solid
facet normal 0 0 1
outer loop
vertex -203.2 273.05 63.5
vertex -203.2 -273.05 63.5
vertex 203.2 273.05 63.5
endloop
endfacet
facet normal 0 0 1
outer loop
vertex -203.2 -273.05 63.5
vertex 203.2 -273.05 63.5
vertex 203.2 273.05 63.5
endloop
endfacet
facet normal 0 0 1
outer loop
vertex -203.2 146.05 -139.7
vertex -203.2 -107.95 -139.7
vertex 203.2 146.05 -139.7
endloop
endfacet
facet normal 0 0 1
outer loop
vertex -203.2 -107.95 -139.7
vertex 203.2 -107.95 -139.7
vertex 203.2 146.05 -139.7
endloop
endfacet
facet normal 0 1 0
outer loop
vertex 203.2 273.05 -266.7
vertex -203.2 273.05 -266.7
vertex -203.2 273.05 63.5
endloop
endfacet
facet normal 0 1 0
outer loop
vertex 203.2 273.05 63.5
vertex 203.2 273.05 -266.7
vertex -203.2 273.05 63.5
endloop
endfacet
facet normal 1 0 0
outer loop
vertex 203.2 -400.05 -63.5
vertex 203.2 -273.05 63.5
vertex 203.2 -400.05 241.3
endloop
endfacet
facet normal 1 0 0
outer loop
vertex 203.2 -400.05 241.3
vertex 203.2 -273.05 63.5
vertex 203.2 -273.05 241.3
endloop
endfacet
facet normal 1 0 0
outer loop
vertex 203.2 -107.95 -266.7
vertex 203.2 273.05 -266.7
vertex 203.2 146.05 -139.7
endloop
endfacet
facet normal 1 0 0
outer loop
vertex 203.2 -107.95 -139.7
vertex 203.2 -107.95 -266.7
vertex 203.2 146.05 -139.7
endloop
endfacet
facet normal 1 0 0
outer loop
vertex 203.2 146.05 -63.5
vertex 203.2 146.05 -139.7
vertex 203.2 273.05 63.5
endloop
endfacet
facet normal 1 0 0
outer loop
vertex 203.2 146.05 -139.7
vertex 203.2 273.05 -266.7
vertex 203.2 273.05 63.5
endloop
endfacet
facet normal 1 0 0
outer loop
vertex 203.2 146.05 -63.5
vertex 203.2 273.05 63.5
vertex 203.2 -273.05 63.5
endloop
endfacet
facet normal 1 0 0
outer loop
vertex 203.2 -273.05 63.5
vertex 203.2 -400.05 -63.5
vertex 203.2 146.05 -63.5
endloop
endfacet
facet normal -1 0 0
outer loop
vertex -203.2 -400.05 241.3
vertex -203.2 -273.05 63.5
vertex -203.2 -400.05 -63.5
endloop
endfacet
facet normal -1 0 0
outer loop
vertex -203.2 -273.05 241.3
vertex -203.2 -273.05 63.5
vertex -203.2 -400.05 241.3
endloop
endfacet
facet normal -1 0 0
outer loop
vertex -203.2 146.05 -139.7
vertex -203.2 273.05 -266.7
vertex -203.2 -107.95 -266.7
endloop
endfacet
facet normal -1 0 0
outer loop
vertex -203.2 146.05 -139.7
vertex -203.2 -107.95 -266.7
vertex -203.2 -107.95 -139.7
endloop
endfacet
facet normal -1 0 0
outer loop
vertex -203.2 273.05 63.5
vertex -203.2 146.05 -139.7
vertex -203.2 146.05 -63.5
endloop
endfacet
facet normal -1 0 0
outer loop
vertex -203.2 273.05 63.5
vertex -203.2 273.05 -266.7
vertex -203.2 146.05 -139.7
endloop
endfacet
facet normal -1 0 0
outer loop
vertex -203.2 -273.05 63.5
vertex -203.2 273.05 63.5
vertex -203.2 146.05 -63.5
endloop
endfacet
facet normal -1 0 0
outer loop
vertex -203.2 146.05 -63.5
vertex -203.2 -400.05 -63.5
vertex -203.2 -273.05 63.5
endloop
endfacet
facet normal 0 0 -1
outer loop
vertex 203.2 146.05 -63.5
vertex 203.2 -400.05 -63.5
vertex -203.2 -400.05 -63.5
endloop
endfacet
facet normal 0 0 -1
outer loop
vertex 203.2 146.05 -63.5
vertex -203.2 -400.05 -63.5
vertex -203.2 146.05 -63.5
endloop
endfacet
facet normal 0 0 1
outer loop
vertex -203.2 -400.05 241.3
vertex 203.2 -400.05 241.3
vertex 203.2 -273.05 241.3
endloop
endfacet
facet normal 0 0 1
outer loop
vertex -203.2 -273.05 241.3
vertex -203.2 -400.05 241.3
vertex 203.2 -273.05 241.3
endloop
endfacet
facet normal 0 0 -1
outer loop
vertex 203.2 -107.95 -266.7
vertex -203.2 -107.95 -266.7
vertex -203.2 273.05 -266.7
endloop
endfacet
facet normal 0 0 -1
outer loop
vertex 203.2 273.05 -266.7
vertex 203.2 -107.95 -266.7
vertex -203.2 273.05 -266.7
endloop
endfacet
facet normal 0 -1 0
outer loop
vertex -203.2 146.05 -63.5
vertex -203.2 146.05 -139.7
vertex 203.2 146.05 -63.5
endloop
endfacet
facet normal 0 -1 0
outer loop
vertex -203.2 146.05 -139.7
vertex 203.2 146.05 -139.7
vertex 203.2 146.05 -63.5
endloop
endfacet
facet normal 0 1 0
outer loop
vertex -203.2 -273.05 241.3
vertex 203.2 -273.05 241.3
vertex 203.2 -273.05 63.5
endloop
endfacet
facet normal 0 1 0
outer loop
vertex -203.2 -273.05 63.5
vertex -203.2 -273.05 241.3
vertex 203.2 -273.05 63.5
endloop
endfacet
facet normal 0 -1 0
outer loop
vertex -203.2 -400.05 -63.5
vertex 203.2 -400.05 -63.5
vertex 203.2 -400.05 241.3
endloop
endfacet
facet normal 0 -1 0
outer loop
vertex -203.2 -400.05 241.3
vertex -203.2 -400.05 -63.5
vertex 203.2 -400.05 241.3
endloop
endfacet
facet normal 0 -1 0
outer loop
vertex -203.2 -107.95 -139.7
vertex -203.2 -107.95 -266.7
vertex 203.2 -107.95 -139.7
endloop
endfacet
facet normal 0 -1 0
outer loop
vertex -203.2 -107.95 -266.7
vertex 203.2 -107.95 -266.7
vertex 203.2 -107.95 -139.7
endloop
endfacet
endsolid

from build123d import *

# Parameters (mm, degrees)
BOSS_EXTRUDE1_DEPTH = 203.2


with BuildPart() as part:
    # Sketch1 → Boss-Extrude1 (new body, symmetric)
    with BuildSketch(Plane(origin=(0, 0, 0), x_dir=(0, 0, -1), z_dir=(1, 0, 0))):
        Polygon((-241.3, -273.05), (-63.5, -273.05), (-63.5, 273.05), (63.5, 273.05), (266.7, 273.05), (266.7, 146.05), (266.7, -107.95), (139.7, -107.95), (139.7, 146.05), (63.5, 146.05), (63.5, -273.05), (63.5, -400.05), (-241.3, -400.05), align=None)
    extrude(amount=BOSS_EXTRUDE1_DEPTH, both=True)


solid = part.part
